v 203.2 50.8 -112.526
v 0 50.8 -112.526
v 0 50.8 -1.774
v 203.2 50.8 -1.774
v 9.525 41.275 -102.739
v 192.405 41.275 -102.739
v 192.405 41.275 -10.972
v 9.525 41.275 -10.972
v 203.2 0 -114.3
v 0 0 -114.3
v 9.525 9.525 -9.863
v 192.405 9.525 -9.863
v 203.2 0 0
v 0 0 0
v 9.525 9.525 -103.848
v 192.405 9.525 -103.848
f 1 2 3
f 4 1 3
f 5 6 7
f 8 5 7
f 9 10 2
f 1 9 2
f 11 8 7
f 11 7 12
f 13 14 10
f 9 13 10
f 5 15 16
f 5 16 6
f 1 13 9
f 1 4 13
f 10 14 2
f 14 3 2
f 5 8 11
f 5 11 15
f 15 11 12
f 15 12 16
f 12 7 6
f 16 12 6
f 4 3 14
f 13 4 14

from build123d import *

# Parameters (mm, degrees)
BOSS_EXTRUDE5_DEPTH = 203.2
CUT_EXTRUDE3_START  = 9.525
CUT_EXTRUDE3_DEPTH  = 182.88


with BuildPart() as part:
    # Sketch6 → Boss-Extrude5 (new body)
    with BuildSketch(Plane(origin=(0, 0, 0), x_dir=(0, 0, -1), z_dir=(1, 0, 0))):
        Polygon((0, 0), (114.3, 0), (112.52602491, 50.8), (1.77397509, 50.8), align=None)
    extrude(amount=BOSS_EXTRUDE5_DEPTH)

    # Sketch9 → Cut-Extrude3 (cut)
    with BuildSketch(Plane(origin=(0, 0, 0), x_dir=(0, 0, -1), z_dir=(1, 0, 0)).offset(CUT_EXTRUDE3_START)):
        Polygon((103.847668826, 9.525), (102.738934394, 41.275), (10.97216067, 41.275), (9.863426239, 9.525), align=None)
    extrude(amount=CUT_EXTRUDE3_DEPTH, mode=Mode.SUBTRACT)


solid = part.part
